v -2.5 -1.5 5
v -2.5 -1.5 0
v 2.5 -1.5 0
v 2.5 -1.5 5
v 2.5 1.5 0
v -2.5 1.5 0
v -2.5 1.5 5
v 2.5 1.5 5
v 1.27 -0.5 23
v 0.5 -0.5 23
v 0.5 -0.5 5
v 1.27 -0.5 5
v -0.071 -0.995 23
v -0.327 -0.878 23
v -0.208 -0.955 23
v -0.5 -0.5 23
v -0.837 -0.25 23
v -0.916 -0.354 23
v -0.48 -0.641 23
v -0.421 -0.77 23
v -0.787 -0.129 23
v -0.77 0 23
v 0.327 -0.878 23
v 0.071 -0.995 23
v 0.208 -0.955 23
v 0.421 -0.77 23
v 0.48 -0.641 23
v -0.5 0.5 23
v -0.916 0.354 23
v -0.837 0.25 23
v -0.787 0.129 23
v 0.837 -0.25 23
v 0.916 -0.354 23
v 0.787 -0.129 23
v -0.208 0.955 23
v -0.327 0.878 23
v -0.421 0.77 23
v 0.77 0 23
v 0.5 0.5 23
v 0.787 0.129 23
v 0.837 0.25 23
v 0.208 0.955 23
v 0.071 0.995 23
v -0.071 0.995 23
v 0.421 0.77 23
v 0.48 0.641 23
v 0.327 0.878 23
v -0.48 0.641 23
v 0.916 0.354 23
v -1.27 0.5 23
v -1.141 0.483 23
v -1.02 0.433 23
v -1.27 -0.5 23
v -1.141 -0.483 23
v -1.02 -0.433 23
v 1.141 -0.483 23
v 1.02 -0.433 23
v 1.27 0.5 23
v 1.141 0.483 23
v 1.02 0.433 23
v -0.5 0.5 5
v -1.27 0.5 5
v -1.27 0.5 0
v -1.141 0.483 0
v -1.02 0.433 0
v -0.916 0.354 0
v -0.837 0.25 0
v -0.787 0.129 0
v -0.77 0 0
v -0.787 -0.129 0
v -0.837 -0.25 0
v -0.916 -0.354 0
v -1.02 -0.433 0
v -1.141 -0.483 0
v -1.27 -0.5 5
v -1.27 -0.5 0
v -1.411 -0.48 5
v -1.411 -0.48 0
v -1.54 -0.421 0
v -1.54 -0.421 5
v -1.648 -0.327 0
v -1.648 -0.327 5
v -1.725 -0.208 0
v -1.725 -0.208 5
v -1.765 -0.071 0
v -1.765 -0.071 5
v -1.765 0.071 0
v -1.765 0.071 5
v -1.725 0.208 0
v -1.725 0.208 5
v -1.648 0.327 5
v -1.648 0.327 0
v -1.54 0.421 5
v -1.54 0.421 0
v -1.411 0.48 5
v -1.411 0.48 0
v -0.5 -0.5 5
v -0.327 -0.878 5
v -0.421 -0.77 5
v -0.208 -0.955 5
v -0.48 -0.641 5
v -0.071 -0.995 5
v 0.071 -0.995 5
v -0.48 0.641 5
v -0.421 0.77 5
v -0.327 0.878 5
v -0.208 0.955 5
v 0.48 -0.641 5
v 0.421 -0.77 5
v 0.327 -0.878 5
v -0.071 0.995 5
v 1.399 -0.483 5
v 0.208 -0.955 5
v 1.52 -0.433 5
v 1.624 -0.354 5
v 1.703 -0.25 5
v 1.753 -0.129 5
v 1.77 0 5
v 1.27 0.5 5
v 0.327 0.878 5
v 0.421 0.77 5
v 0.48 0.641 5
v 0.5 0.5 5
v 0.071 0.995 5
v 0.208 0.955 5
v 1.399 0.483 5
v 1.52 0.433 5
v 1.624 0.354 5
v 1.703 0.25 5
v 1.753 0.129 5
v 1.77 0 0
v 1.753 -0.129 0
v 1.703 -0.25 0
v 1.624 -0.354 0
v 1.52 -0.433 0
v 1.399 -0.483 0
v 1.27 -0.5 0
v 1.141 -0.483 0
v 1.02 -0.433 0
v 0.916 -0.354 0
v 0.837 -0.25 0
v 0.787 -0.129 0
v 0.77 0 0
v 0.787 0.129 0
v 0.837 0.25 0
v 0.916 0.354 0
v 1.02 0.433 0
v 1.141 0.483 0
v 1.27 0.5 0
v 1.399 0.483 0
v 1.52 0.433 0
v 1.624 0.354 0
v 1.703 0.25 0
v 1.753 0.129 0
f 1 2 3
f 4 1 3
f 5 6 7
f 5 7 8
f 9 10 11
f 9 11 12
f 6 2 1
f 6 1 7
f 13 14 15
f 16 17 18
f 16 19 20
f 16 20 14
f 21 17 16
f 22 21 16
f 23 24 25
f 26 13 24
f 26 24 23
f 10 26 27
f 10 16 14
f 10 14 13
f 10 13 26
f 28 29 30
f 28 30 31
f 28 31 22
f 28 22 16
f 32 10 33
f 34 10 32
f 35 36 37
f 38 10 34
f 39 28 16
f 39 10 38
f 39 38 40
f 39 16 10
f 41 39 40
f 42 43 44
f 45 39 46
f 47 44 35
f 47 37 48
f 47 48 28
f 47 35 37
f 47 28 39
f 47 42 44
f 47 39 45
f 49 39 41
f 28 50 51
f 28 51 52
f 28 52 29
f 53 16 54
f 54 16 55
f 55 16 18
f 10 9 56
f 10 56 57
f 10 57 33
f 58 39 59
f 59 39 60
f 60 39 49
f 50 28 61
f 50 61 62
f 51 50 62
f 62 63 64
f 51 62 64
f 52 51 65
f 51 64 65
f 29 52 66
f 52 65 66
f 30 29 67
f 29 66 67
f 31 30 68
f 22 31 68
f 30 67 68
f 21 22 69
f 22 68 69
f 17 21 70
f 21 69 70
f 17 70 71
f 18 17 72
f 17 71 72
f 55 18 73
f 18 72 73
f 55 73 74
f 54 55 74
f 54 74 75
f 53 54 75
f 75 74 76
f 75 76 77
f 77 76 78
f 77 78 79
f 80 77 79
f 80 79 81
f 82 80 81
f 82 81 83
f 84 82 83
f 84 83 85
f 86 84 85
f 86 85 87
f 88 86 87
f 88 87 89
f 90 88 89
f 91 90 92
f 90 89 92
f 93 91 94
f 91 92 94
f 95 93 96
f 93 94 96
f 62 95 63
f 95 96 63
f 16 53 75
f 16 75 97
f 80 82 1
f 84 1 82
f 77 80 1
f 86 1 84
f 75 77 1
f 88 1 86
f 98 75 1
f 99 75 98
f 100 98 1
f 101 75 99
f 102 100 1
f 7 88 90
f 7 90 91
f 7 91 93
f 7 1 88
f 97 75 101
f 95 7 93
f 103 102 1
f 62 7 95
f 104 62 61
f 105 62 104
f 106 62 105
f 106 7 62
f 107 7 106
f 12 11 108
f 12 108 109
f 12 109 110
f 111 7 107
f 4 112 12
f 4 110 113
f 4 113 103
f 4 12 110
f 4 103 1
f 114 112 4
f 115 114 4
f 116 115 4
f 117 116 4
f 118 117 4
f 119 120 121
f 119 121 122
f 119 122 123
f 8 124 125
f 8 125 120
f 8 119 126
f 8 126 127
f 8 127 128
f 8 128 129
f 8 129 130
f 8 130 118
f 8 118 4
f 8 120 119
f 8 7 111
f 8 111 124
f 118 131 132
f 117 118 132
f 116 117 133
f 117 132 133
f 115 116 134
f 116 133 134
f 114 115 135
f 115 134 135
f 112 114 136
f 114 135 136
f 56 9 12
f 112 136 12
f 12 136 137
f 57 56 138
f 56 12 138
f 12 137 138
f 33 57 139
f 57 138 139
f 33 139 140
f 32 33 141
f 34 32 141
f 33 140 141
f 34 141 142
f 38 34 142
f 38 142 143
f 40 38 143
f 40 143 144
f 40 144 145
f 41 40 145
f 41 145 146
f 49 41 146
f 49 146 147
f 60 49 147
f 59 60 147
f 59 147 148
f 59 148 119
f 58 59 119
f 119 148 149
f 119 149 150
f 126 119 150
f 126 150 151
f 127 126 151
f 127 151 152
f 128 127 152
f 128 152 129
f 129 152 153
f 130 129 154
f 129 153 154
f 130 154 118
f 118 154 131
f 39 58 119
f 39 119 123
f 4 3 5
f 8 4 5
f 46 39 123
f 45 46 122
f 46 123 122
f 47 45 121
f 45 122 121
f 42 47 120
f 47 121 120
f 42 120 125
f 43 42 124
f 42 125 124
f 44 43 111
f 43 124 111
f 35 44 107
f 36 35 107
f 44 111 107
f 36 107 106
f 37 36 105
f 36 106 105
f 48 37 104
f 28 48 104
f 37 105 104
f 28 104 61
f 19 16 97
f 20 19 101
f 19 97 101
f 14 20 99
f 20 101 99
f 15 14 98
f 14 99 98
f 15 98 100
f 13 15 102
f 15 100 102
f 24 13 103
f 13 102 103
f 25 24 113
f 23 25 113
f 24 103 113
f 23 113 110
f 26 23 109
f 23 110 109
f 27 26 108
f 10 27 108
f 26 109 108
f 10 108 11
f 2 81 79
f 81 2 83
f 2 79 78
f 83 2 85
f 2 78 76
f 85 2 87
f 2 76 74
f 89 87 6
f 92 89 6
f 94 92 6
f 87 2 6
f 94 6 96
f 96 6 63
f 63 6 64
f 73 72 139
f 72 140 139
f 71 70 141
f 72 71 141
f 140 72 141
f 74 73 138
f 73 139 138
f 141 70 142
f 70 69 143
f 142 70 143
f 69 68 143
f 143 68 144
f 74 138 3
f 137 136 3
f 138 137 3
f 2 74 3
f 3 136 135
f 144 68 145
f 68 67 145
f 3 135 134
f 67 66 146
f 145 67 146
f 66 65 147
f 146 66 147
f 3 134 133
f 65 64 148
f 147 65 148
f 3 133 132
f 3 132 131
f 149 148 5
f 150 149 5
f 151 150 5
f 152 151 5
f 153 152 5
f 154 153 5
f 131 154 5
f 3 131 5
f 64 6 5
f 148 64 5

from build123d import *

# Parameters (mm, degrees)
F0_W     = 5
F0_H     = 3
F1_DEPTH = 5
F2_DEPTH = 23


with BuildPart() as f1:
    # F0 (on Top) → F1 (new body)
    with BuildSketch(Plane.XY):
        Rectangle(F0_W, F0_H)
        with BuildLine():
            ThreePointArc((-0.5, 0.5), (0, 1), (0.5, 0.5))
            Line((0.5, 0.5), (1.27, 0.5))
            ThreePointArc((1.27, 0.5), (1.6235533906, 0.3535533906), (1.77, 0))
            ThreePointArc((1.77, 0), (1.6235533906, -0.3535533906), (1.27, -0.5))
            Line((1.27, -0.5), (0.5, -0.5))
            ThreePointArc((0.5, -0.5), (0, -1), (-0.5, -0.5))
            Line((-0.5, -0.5), (-1.27, -0.5))
            ThreePointArc((-1.27, -0.5), (-1.77, 0), (-1.27, 0.5))
            Line((-1.27, 0.5), (-0.5, 0.5))
        make_face(mode=Mode.SUBTRACT)
        with BuildLine():
            Line((-0.5, 0.5), (0.5, 0.5))
            ThreePointArc((0.5, 0.5), (0, 1), (-0.5, 0.5))
        make_face()
        with BuildLine():
            ThreePointArc((-0.5, 0.5), (-0.3535533906, 0.1464466094), (0, 0))
            ThreePointArc((0, 0), (0.3535533906, 0.1464466094), (0.5, 0.5))
            Line((0.5, 0.5), (-0.5, 0.5))
        make_face()
        with BuildLine():
            ThreePointArc((0.5, -0.5), (0.3535533906, -0.1464466094), (0, 0))
            ThreePointArc((0, 0), (-0.3535533906, -0.1464466094), (-0.5, -0.5))
            Line((-0.5, -0.5), (0.5, -0.5))
        make_face()
        with BuildLine():
            ThreePointArc((-0.5, -0.5), (0, -1), (0.5, -0.5))
            Line((0.5, -0.5), (-0.5, -0.5))
        make_face()
        with BuildLine():
            ThreePointArc((-0.5, -0.5), (-0.3535533906, -0.1464466094), (0, 0))
            ThreePointArc((0, 0), (-0.3535533906, 0.1464466094), (-0.5, 0.5))
            Line((-0.5, 0.5), (-1.27, 0.5))
            ThreePointArc((-1.27, 0.5), (-0.9164466094, 0.3535533906), (-0.77, 0))
            ThreePointArc((-0.77, 0), (-0.9164466094, -0.3535533906), (-1.27, -0.5))
            Line((-1.27, -0.5), (-0.5, -0.5))
        make_face()
        with BuildLine():
            ThreePointArc((0.5, 0.5), (0.3535533906, 0.1464466094), (0, 0))
            Line((0, 0), (0.77, 0))
            ThreePointArc((0.77, 0), (0.9164466094, 0.3535533906), (1.27, 0.5))
            Line((1.27, 0.5), (0.5, 0.5))
        make_face()
        with BuildLine():
            Line((0.77, 0), (0, 0))
            ThreePointArc((0, 0), (0.3535533906, -0.1464466094), (0.5, -0.5))
            Line((0.5, -0.5), (1.27, -0.5))
            ThreePointArc((1.27, -0.5), (0.9164466094, -0.3535533906), (0.77, 0))
        make_face()
    extrude(amount=F1_DEPTH)

    # F0 (on Top) → F2 (join)
    with BuildSketch(Plane.XY):
        with BuildLine():
            ThreePointArc((-0.5, -0.5), (-0.3535533906, -0.1464466094), (0, 0))
            ThreePointArc((0, 0), (-0.3535533906, 0.1464466094), (-0.5, 0.5))
            Line((-0.5, 0.5), (-1.27, 0.5))
            ThreePointArc((-1.27, 0.5), (-0.9164466094, 0.3535533906), (-0.77, 0))
            ThreePointArc((-0.77, 0), (-0.9164466094, -0.3535533906), (-1.27, -0.5))
            Line((-1.27, -0.5), (-0.5, -0.5))
        make_face()
        with BuildLine():
            ThreePointArc((0.5, -0.5), (0.3535533906, -0.1464466094), (0, 0))
            ThreePointArc((0, 0), (-0.3535533906, -0.1464466094), (-0.5, -0.5))
            Line((-0.5, -0.5), (0.5, -0.5))
        make_face()
        with BuildLine():
            ThreePointArc((-0.5, -0.5), (0, -1), (0.5, -0.5))
            Line((0.5, -0.5), (-0.5, -0.5))
        make_face()
        with BuildLine():
            ThreePointArc((-0.5, 0.5), (-0.3535533906, 0.1464466094), (0, 0))
            ThreePointArc((0, 0), (0.3535533906, 0.1464466094), (0.5, 0.5))
            Line((0.5, 0.5), (-0.5, 0.5))
        make_face()
        with BuildLine():
            Line((-0.5, 0.5), (0.5, 0.5))
            ThreePointArc((0.5, 0.5), (0, 1), (-0.5, 0.5))
        make_face()
        with BuildLine():
            ThreePointArc((0.5, 0.5), (0.3535533906, 0.1464466094), (0, 0))
            Line((0, 0), (0.77, 0))
            ThreePointArc((0.77, 0), (0.9164466094, 0.3535533906), (1.27, 0.5))
            Line((1.27, 0.5), (0.5, 0.5))
        make_face()
        with BuildLine():
            Line((0.77, 0), (0, 0))
            ThreePointArc((0, 0), (0.3535533906, -0.1464466094), (0.5, -0.5))
            Line((0.5, -0.5), (1.27, -0.5))
            ThreePointArc((1.27, -0.5), (0.9164466094, -0.3535533906), (0.77, 0))
        make_face()
    extrude(amount=F2_DEPTH)


solid = f1.part
